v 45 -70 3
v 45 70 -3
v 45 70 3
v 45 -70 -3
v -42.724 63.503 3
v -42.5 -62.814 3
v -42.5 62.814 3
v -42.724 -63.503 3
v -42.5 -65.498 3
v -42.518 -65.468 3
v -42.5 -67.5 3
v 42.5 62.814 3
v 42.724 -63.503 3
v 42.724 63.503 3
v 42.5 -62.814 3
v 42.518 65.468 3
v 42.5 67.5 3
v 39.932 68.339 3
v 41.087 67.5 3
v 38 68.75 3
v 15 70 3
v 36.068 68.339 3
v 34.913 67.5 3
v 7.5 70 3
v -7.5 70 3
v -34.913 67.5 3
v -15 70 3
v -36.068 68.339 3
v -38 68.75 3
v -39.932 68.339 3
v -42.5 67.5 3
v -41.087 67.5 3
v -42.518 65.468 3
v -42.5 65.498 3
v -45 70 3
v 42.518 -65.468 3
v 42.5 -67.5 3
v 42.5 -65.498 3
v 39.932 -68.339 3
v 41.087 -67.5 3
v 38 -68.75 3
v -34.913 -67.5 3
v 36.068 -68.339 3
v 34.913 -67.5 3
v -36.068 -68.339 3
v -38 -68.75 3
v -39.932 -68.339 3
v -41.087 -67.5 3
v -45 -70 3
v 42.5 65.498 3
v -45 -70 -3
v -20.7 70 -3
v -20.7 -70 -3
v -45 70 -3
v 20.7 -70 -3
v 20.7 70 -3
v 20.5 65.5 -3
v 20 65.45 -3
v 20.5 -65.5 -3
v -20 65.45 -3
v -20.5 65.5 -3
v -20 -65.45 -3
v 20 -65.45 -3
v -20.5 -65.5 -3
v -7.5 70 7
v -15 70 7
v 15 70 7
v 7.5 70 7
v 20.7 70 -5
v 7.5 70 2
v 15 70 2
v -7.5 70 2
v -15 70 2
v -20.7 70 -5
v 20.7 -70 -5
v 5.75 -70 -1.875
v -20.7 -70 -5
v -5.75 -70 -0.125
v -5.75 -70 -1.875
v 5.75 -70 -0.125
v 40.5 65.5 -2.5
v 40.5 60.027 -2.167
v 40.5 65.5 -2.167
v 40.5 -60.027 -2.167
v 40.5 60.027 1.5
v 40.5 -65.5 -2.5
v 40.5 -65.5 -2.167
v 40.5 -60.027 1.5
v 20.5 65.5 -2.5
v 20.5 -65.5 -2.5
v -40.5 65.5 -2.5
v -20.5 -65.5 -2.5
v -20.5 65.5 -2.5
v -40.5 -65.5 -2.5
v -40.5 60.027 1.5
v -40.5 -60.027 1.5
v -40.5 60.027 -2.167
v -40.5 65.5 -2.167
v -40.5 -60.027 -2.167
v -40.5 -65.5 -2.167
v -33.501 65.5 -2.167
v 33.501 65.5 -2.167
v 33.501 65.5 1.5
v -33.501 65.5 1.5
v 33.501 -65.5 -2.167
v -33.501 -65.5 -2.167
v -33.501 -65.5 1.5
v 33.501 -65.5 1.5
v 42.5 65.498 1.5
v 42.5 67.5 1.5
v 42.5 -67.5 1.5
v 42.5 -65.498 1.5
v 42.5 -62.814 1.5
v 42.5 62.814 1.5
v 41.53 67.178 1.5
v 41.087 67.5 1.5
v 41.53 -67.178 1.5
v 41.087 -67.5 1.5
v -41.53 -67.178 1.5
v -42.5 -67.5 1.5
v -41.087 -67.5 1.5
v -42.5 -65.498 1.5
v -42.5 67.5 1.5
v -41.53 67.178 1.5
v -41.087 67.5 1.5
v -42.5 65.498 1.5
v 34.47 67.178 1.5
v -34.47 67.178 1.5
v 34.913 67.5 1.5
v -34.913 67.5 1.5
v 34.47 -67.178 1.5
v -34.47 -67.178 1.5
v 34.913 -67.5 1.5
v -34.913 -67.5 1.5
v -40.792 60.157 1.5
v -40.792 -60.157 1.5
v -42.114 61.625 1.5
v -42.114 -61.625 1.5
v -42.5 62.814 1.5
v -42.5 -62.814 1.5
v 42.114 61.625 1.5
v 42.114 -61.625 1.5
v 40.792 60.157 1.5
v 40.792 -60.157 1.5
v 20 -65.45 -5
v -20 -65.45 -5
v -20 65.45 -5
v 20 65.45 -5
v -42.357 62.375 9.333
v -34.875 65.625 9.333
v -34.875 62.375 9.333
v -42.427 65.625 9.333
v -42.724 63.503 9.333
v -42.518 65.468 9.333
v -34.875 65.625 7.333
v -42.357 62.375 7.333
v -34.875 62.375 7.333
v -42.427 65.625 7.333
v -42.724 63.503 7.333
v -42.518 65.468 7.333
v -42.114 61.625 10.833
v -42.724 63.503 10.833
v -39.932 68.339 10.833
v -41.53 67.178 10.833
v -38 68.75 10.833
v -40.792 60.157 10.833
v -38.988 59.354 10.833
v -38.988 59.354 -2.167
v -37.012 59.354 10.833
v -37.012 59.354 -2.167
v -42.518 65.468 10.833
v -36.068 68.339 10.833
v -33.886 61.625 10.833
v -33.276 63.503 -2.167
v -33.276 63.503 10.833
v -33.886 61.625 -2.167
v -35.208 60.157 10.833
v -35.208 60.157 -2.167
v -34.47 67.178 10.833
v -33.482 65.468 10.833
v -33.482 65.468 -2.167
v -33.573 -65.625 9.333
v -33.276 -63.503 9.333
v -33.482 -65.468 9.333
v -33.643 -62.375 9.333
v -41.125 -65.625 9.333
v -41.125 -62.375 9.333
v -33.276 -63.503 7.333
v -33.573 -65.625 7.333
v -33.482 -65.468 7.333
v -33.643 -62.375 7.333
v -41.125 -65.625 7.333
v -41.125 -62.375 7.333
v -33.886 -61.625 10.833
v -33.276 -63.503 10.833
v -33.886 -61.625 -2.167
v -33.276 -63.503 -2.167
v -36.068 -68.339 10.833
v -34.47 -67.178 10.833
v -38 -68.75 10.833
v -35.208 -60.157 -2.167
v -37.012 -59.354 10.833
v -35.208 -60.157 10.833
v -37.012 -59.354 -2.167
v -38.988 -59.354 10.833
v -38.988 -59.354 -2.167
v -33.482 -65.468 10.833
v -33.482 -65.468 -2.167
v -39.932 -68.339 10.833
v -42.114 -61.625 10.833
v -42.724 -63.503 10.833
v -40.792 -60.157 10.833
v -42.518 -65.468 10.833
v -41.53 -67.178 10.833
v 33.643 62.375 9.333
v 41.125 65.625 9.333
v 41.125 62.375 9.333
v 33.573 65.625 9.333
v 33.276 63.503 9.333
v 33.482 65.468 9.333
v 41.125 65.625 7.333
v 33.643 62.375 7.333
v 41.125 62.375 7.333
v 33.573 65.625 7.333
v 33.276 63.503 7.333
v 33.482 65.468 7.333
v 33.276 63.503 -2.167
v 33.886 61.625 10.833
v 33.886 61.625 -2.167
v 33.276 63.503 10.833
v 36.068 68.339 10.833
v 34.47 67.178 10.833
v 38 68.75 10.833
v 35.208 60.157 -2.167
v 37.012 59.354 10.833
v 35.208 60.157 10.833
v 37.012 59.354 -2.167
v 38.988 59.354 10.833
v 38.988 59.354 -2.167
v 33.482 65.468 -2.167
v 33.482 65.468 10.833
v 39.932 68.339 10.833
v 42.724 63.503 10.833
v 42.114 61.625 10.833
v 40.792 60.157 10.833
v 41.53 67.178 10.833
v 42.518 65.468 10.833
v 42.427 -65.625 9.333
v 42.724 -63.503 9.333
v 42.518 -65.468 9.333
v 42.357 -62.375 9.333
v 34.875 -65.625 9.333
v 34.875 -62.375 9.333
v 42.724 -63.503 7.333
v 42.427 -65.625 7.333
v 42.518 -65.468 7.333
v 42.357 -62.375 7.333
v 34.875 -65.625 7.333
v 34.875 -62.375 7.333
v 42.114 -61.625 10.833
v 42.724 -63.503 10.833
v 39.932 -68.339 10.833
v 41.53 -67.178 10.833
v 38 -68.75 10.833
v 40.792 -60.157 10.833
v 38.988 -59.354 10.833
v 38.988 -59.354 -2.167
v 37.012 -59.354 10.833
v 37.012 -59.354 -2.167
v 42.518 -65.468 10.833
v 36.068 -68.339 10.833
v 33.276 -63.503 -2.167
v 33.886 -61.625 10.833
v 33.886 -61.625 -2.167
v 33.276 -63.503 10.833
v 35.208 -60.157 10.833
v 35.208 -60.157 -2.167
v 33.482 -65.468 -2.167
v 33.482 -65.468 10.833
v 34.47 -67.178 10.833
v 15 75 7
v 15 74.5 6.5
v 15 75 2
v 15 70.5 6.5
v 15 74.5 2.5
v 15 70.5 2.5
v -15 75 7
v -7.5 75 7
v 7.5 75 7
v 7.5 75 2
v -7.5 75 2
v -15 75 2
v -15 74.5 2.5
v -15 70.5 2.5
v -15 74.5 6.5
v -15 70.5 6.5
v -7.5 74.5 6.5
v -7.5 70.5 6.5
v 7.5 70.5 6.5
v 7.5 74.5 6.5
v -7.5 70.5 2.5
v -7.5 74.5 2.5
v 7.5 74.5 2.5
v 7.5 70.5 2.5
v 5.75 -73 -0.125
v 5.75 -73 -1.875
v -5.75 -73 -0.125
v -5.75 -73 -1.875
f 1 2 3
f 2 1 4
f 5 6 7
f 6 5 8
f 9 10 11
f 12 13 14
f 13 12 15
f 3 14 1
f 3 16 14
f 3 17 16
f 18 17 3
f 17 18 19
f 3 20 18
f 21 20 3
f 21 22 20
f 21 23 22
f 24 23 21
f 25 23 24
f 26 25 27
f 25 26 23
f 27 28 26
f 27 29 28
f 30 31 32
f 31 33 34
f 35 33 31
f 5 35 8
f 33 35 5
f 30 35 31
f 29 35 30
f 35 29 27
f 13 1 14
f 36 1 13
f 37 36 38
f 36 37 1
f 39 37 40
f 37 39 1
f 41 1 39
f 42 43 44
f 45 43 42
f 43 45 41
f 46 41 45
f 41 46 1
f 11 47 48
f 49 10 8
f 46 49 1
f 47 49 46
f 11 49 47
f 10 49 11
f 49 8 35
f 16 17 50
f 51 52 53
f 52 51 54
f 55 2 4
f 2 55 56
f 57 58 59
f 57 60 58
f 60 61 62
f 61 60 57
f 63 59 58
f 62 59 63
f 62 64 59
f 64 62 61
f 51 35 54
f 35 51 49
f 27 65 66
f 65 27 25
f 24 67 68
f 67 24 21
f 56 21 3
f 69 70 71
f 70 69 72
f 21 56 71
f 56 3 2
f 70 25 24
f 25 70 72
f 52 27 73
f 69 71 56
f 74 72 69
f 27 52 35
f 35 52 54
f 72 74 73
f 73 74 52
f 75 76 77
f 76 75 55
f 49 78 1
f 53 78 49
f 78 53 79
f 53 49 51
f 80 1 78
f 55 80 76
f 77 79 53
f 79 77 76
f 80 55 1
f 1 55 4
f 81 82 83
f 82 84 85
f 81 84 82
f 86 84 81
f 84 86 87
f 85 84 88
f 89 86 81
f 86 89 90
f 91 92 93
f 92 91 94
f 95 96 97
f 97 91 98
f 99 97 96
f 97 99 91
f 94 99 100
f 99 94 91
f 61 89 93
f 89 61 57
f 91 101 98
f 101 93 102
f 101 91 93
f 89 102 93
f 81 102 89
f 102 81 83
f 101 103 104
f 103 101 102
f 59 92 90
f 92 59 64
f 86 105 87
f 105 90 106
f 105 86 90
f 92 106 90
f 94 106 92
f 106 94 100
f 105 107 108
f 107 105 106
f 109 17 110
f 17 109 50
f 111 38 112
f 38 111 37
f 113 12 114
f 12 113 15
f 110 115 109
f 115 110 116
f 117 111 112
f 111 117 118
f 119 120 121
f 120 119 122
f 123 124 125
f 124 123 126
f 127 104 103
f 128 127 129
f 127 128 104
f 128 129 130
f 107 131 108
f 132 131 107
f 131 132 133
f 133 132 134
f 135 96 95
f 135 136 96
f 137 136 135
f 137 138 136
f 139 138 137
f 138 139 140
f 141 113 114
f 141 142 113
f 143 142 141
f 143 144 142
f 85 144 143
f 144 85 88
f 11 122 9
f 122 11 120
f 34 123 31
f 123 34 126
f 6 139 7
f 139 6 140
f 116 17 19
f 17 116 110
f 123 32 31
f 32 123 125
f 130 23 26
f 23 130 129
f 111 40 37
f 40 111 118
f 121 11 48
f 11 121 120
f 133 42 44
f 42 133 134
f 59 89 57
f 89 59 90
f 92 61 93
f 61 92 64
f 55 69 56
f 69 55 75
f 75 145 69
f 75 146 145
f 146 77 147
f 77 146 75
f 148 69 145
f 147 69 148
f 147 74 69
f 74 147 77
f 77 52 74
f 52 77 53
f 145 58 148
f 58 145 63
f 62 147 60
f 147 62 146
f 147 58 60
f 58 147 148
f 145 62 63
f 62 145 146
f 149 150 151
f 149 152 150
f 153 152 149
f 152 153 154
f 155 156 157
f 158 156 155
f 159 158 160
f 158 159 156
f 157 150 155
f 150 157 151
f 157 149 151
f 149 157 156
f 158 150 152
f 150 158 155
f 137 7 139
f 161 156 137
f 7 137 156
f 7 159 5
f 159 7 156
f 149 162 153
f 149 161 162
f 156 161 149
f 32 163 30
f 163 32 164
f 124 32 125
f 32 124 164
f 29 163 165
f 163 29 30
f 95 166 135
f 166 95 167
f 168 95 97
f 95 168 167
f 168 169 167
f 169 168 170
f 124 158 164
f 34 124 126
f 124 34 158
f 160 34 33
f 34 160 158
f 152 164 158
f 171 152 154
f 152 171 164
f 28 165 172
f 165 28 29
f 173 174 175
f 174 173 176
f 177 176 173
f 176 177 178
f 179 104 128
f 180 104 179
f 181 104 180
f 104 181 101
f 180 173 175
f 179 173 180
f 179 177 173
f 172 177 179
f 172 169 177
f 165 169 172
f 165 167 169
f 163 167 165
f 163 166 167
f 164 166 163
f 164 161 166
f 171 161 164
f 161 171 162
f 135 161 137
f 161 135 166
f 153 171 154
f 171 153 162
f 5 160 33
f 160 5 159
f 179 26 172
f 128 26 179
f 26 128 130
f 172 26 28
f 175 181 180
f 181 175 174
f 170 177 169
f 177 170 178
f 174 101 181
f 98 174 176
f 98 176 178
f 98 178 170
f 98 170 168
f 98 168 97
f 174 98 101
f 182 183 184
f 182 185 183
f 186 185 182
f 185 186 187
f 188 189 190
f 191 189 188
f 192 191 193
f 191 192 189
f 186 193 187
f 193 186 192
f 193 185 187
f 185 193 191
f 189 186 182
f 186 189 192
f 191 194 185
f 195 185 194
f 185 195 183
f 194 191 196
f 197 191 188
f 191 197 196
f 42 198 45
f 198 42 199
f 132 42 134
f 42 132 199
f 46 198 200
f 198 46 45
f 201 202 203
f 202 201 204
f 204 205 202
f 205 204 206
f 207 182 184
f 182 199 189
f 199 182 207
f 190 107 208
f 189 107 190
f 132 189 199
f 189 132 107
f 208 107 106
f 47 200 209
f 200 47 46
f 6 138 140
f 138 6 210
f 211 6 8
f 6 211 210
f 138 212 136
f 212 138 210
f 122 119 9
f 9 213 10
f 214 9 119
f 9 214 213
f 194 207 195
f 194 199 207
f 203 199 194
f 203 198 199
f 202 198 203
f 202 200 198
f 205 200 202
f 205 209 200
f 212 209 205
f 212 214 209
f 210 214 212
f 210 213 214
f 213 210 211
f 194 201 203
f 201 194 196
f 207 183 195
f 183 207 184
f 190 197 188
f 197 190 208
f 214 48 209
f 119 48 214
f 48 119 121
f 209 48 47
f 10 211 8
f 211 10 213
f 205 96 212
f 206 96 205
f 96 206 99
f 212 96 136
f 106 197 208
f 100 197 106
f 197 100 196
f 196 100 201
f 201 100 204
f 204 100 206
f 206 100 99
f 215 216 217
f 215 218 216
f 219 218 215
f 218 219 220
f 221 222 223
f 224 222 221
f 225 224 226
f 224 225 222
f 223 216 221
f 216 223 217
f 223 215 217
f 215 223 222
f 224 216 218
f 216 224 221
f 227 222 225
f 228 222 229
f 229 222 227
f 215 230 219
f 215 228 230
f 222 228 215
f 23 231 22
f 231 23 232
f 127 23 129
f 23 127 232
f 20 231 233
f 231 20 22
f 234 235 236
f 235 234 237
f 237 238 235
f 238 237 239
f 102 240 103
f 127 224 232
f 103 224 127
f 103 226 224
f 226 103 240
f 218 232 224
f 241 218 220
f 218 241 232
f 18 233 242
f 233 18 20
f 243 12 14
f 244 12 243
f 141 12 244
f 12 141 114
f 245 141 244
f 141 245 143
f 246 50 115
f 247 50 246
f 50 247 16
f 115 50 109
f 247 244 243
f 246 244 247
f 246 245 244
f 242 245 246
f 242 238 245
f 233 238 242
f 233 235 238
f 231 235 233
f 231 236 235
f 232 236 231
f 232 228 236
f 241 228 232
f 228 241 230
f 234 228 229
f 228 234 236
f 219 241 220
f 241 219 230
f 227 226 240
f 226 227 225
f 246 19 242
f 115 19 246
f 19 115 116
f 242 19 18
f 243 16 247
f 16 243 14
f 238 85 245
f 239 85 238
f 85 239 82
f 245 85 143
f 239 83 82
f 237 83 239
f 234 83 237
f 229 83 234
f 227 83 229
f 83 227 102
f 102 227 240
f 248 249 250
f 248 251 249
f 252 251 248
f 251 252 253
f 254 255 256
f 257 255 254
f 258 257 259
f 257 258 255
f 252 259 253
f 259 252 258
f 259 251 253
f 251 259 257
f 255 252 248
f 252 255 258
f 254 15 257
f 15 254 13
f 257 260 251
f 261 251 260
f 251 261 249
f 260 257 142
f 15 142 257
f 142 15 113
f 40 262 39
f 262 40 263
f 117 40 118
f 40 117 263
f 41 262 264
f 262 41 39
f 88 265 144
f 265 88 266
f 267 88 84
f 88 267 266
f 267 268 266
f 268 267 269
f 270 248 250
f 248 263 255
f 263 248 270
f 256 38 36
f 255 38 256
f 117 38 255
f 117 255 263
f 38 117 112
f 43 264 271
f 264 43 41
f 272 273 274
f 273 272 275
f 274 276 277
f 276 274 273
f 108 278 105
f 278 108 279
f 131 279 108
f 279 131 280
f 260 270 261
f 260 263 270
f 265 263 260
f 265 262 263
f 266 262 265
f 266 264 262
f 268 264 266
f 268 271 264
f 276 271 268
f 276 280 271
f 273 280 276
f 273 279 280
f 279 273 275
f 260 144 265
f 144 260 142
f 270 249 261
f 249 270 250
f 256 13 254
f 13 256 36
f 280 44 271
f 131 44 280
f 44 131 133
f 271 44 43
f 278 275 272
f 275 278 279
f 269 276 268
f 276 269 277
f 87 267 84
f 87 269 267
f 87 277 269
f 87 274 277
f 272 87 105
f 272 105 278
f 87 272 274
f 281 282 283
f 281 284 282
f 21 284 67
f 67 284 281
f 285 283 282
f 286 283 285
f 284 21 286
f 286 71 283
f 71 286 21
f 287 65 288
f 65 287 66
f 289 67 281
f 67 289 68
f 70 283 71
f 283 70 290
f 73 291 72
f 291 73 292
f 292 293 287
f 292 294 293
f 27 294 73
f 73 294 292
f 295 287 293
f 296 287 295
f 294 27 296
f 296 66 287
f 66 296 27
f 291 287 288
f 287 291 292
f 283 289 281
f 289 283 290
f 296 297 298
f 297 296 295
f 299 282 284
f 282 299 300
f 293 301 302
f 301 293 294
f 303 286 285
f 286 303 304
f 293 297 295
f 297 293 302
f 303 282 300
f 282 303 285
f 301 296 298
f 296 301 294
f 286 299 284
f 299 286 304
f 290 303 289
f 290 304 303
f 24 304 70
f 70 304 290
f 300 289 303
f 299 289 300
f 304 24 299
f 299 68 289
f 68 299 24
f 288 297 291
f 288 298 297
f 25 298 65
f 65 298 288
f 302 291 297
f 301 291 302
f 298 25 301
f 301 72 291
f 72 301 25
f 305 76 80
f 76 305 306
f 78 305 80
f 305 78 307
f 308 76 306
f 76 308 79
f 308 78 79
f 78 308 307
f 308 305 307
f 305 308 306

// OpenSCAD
// file: connector-blocks.scad
//////////////////////////////////////////////////////////////////////////////////////////////
// This module is used for connecting the snorkel to the filter.//
//////////////////////////////////////////////////////////////////////////////////////////////

// Generates two BLUEoutside blocks for the plug to connect through.
module connector_block_cutout(ccube_x, ccube_y, ccube_z){
    color("blue")
    difference() {
        cube([ccube_x, ccube_y, ccube_z],center=true);
        cube([ccube_x+2, ccube_y-1, ccube_z-1],center=true);
    }
}

// Generates RED inside block for the plug to connect through.
module connector_block_outsides(ccube_x, ccube_y, ccube_z){
    color("red")
    difference() {
        connector_block_cutout(ccube_x, ccube_y, ccube_z);
        cube([ccube_x-15, ccube_y+2, ccube_z+2],center=true);
    }
}

// Generates the white plug to hold the parts together.
module connector_block_peg(ccube_x, ccube_y, ccube_z){
    color("white")
    difference() {
        cube([ccube_x+2, ccube_y, ccube_z],center=true);
        translate([-1, 0, 0])
        connector_block_cutout(ccube_x+.25, ccube_y+.25, ccube_z+.25);
    }
}

// Generates two BLUEoutside blocks for the plug to connect through.
connector_block_outsides(ccube_x=30, ccube_y=5, ccube_z=5);

// Generates RED inside block for the plug to connect through.
connector_block_cutout(ccube_x=15, ccube_y=5, ccube_z=5);

// Generates the white plug to hold the parts together.
//connector_block_peg(ccube_x=30, ccube_y=5, ccube_z=5);
// file: snorkel-tube-attachment.scad
//////////////////////////////////////////////////////////////////////////////////////////////
// This module is used for maintaining the connector tube to the PM2.5 Filter holder bottom.//
//////////////////////////////////////////////////////////////////////////////////////////////

// This imports the connector blocks, designed to connect the snorkel to the filter bottom.
use <connector-blocks.scad>


// This module is for generating the outer tube wall.
module snorkel_tube_outer_wall(snorkel_diameter, snorkel_tube_height, snorkel_tube_radius){
    hull() {
        translate([0, snorkel_diameter, 0]) 
        cylinder(h = snorkel_tube_height, r1 = snorkel_tube_radius, r2 = snorkel_tube_radius, center = true);
        cylinder(h = snorkel_tube_height, r1 = snorkel_tube_radius, r2 = snorkel_tube_radius, center = true);
        }
}

// This module is for removing the center of the tube.
module snorkel_tube_inner_cutout(snorkel_diameter, snorkel_tube_height, snorkel_tube_radius){
    translate([0, 0, -1])
    hull() {
        translate([0, snorkel_diameter, 0]) 
        cylinder(h = snorkel_tube_height-1, r1 = snorkel_tube_radius-1, r2 = snorkel_tube_radius-1, center = true);
        cylinder(h = snorkel_tube_height-1, r1 = snorkel_tube_radius-1, r2 = snorkel_tube_radius-1, center = true);
    }
}


// This module combines the first two modules to diff the inner out of the outer wall.
module diffed_snorkel_tube(snorkel_diameter, snorkel_tube_height, snorkel_tube_radius){
    
    translate([0, -(snorkel_diameter/2), 0])
    difference(){
    snorkel_tube_outer_wall(snorkel_diameter, snorkel_tube_height, snorkel_tube_radius);
    snorkel_tube_inner_cutout(snorkel_diameter, snorkel_tube_height, snorkel_tube_radius);
    
    color("red")
    translate([-11, 0, 13.5])
    cube([10,90,140],center=true);

    // Snorkel tube backside cutout.
    color("purple")
    translate([-8, 12.5, 84])
    cube([2,12,6], center=true);   

    }
   
}

// This module is for generating connector clip to connect the tube to the mask.
module connector_clip(){
    difference(){
        cube([15,20,1],center=true);
        translate([-1,0,0])
        cube([6,12,10],center=true);      
    }
}

module snorkel_filter_attachment_tube(snorkel_diameter, snorkel_tube_height, snorkel_tube_radius){
    rotate([90,90,0])
    translate([9, 0, -15])   
    diffed_snorkel_tube(snorkel_diameter, snorkel_tube_height, snorkel_tube_radius);   
    
    // This adds the black connector section on the front to connect the filter bottom to the snorkel tube.
    //use <connector-blocks.scad>
    color("black")
    translate([0,74,4.5])
    connector_block_cutout(ccube_x=15, ccube_y=5, ccube_z=5);
    
    color("green")
    rotate([0,0,90])
    translate([104,0, -19.5])
    connector_clip();
  
}

snorkel_filter_attachment_tube(snorkel_diameter=25.5, snorkel_tube_height=170, snorkel_tube_radius=11);
// file: connector-pegs.scad
//////////////////////////////////////////////////////////////////
// This module is used for generating the peg cutouts and pegs. //
//////////////////////////////////////////////////////////////////

// peg_space: This controls the X-axis space between the pegs.
// number_of_pegs: This defines the number of pegs to generate.
// peg_height: This defines the Z-axis height of the peg.
// peg_radius: This determines the diameter/circumferance of each peg.
// peg_y_position: This determines the Y-axis position of the pegs.

// This generates the GREEN peg clip.
module peg_connector_clip(connector_clip_x, connector_clip_y, connector_clip_z) {
    color("green")
    cube([connector_clip_x, connector_clip_y, connector_clip_z],true);
    translate([connector_clip_y+2,0,.25])
    cube([2,5,2.5],true);
}

// This generates the WHITE hole size in the Blue peg so the GREEN clip can slide in.
module peg_connector_hole(connector_clip_x, connector_clip_y, connector_clip_z) {
    color("white")
    peg_connector_clip(connector_clip_x+.25, connector_clip_y+.25, connector_clip_z);
}

// This module combines and diffs the WHITE hole from the BLUE peg.
module peg(peg_height, peg_radius, connector_clip_x, connector_clip_y, connector_clip_z) {
    difference() {
        // This generates the BLUE peg.
        color("blue")
        cylinder(h = peg_height, r1 = peg_radius, r2 = peg_radius, center = true);
        
        // This is the WHITE peg Hole.
        rotate([0,0,90])
        translate([2, 0, +4])
        peg_connector_hole(connector_clip_x, connector_clip_y, connector_clip_z);
    }
}

// This module generates "number_of_pegs" at "pegs_space" in millimeters apart.
module holder_pegs(peg_space, number_of_pegs, peg_height, peg_radius, connector_clip_x, connector_clip_y, connector_clip_z) {
    for (i=[0: 360/number_of_pegs: 360])
        rotate([0,0,i])
        translate([peg_space,0,0])
        peg(peg_height, peg_radius, connector_clip_x, connector_clip_y, connector_clip_z);
}


peg_y_position=20;

translate([0,peg_y_position,0])
holder_pegs(peg_space=60,
            number_of_pegs=2,
            peg_height=12,
            peg_radius=5,
            connector_clip_x=13,
            connector_clip_y=3,
            connector_clip_z=2);

//translate([0,-peg_y_position,0])
//holder_pegs(peg_space=60,
//            number_of_pegs=2,
//            peg_height=12,
//            peg_radius=5,
//            connector_clip_x=10,
//            connector_clip_y=3,
//            connector_clip_z=2);

//peg_connector_clip(connector_clip_x=10,
//                   connector_clip_y=3,
//                   connector_clip_z=2);
// main file
/////////////////////////////////////////////////////////////////////////////////////////
// This module is used for creating the box for the snorkel tube and filter to connect.//
/////////////////////////////////////////////////////////////////////////////////////////

// This imports the peg hole's to make the cutouts in the filter holder.
use <connector-pegs.scad>
// This imports the peg hole's to make the cutouts in the filter holder.
use <snorkel-tube-attachment.scad>
// This imports the connector blocks, designed to connect the snorkel to the filter bottom.
use <connector-blocks.scad>

//Bottom half of the air filter holder.
module filter_holder_bottom(filter_holder_top_x, filter_holder_top_y, filter_holder_top_z, snorkel_tube_height, snorkel_tube_radius, snorkel_diameter, peg_space, number_of_pegs, peg_height, peg_radius, peg_y_position, connector_clip_x, connector_clip_y, connector_clip_z) {
    
    
    difference() {
        // This is the YELLOW base plate that everything is carving out of.
        color("yellow")
        cube([filter_holder_top_x, filter_holder_top_y, filter_holder_top_z], center=true);
        
        // This is the initial ORANGE area carved out of the inside of the YELLOW section.
        color("orange")
        cube([filter_holder_top_x-9, filter_holder_top_y-9, filter_holder_top_z-1], center=true);
        
        // This is the GREEN edge so that the filter layer connects nicely to this piece.
        color("green")
        translate([0,0,filter_holder_top_z-1])
        cube([filter_holder_top_x-5, filter_holder_top_y-5, filter_holder_top_z+1], center=true);
        
        // This is the PINK cutout so that the snorkel attachment can connect to the YELLOW base layer for the snorkel attacnment.
        color("pink")
        translate([0, 0, 0])
        cube([41, 131, 12], center=true);

    }
    
    // Bottom square to make a tighter fit to the tube.
    color("white")
    translate([0, 0, -4])
    difference(){
        cube([41.4, filter_holder_top_y, 2], center=true);
        cube([40, filter_holder_top_y-9.1, 5], center=true);
    }    
    
    // This section is for generating the BLUE pegs. Color defined in connector_pegs.scad file.
    // use <connector-pegs.scad>
    rotate([0,0,90])
    translate([0,peg_y_position,peg_height/3])
    holder_pegs(peg_space, number_of_pegs, peg_height, peg_radius-.25, connector_clip_x, connector_clip_y, connector_clip_z);

    rotate([0,0,90])
    translate([0,-peg_y_position,peg_height/3])
    holder_pegs(peg_space, number_of_pegs, peg_height, peg_radius-.25, connector_clip_x, connector_clip_y, connector_clip_z);
    
    // This section is for adding the BLACK connector blocks used to secure YELLOW to snorkel tube.
    // use <connector-blocks.scad> 
    color("black")
    translate([0,72.5,4.5])
    connector_block_outsides(ccube_x=30, ccube_y=5, ccube_z=5);
    
    
    // This section is for adding the PURPLE connector peg at the back of the YELLOW layer.
    color("purple")
    translate([0, -70, -1])
    cube([11.5,6,1.75], center=true);

}

filter_holder_bottom(filter_holder_top_x=90,
                     filter_holder_top_y=140,
                     filter_holder_top_z=6,
                     snorkel_diameter=20,
                     snorkel_tube_height=5,
                     snorkel_tube_radius=10,
                     peg_y_position=38,
                     peg_space=64,
                     number_of_pegs=2,
                     peg_height=13,
                     peg_radius=5,
                     connector_clip_x=10,
                     connector_clip_y=3,
                     connector_clip_z=2);
